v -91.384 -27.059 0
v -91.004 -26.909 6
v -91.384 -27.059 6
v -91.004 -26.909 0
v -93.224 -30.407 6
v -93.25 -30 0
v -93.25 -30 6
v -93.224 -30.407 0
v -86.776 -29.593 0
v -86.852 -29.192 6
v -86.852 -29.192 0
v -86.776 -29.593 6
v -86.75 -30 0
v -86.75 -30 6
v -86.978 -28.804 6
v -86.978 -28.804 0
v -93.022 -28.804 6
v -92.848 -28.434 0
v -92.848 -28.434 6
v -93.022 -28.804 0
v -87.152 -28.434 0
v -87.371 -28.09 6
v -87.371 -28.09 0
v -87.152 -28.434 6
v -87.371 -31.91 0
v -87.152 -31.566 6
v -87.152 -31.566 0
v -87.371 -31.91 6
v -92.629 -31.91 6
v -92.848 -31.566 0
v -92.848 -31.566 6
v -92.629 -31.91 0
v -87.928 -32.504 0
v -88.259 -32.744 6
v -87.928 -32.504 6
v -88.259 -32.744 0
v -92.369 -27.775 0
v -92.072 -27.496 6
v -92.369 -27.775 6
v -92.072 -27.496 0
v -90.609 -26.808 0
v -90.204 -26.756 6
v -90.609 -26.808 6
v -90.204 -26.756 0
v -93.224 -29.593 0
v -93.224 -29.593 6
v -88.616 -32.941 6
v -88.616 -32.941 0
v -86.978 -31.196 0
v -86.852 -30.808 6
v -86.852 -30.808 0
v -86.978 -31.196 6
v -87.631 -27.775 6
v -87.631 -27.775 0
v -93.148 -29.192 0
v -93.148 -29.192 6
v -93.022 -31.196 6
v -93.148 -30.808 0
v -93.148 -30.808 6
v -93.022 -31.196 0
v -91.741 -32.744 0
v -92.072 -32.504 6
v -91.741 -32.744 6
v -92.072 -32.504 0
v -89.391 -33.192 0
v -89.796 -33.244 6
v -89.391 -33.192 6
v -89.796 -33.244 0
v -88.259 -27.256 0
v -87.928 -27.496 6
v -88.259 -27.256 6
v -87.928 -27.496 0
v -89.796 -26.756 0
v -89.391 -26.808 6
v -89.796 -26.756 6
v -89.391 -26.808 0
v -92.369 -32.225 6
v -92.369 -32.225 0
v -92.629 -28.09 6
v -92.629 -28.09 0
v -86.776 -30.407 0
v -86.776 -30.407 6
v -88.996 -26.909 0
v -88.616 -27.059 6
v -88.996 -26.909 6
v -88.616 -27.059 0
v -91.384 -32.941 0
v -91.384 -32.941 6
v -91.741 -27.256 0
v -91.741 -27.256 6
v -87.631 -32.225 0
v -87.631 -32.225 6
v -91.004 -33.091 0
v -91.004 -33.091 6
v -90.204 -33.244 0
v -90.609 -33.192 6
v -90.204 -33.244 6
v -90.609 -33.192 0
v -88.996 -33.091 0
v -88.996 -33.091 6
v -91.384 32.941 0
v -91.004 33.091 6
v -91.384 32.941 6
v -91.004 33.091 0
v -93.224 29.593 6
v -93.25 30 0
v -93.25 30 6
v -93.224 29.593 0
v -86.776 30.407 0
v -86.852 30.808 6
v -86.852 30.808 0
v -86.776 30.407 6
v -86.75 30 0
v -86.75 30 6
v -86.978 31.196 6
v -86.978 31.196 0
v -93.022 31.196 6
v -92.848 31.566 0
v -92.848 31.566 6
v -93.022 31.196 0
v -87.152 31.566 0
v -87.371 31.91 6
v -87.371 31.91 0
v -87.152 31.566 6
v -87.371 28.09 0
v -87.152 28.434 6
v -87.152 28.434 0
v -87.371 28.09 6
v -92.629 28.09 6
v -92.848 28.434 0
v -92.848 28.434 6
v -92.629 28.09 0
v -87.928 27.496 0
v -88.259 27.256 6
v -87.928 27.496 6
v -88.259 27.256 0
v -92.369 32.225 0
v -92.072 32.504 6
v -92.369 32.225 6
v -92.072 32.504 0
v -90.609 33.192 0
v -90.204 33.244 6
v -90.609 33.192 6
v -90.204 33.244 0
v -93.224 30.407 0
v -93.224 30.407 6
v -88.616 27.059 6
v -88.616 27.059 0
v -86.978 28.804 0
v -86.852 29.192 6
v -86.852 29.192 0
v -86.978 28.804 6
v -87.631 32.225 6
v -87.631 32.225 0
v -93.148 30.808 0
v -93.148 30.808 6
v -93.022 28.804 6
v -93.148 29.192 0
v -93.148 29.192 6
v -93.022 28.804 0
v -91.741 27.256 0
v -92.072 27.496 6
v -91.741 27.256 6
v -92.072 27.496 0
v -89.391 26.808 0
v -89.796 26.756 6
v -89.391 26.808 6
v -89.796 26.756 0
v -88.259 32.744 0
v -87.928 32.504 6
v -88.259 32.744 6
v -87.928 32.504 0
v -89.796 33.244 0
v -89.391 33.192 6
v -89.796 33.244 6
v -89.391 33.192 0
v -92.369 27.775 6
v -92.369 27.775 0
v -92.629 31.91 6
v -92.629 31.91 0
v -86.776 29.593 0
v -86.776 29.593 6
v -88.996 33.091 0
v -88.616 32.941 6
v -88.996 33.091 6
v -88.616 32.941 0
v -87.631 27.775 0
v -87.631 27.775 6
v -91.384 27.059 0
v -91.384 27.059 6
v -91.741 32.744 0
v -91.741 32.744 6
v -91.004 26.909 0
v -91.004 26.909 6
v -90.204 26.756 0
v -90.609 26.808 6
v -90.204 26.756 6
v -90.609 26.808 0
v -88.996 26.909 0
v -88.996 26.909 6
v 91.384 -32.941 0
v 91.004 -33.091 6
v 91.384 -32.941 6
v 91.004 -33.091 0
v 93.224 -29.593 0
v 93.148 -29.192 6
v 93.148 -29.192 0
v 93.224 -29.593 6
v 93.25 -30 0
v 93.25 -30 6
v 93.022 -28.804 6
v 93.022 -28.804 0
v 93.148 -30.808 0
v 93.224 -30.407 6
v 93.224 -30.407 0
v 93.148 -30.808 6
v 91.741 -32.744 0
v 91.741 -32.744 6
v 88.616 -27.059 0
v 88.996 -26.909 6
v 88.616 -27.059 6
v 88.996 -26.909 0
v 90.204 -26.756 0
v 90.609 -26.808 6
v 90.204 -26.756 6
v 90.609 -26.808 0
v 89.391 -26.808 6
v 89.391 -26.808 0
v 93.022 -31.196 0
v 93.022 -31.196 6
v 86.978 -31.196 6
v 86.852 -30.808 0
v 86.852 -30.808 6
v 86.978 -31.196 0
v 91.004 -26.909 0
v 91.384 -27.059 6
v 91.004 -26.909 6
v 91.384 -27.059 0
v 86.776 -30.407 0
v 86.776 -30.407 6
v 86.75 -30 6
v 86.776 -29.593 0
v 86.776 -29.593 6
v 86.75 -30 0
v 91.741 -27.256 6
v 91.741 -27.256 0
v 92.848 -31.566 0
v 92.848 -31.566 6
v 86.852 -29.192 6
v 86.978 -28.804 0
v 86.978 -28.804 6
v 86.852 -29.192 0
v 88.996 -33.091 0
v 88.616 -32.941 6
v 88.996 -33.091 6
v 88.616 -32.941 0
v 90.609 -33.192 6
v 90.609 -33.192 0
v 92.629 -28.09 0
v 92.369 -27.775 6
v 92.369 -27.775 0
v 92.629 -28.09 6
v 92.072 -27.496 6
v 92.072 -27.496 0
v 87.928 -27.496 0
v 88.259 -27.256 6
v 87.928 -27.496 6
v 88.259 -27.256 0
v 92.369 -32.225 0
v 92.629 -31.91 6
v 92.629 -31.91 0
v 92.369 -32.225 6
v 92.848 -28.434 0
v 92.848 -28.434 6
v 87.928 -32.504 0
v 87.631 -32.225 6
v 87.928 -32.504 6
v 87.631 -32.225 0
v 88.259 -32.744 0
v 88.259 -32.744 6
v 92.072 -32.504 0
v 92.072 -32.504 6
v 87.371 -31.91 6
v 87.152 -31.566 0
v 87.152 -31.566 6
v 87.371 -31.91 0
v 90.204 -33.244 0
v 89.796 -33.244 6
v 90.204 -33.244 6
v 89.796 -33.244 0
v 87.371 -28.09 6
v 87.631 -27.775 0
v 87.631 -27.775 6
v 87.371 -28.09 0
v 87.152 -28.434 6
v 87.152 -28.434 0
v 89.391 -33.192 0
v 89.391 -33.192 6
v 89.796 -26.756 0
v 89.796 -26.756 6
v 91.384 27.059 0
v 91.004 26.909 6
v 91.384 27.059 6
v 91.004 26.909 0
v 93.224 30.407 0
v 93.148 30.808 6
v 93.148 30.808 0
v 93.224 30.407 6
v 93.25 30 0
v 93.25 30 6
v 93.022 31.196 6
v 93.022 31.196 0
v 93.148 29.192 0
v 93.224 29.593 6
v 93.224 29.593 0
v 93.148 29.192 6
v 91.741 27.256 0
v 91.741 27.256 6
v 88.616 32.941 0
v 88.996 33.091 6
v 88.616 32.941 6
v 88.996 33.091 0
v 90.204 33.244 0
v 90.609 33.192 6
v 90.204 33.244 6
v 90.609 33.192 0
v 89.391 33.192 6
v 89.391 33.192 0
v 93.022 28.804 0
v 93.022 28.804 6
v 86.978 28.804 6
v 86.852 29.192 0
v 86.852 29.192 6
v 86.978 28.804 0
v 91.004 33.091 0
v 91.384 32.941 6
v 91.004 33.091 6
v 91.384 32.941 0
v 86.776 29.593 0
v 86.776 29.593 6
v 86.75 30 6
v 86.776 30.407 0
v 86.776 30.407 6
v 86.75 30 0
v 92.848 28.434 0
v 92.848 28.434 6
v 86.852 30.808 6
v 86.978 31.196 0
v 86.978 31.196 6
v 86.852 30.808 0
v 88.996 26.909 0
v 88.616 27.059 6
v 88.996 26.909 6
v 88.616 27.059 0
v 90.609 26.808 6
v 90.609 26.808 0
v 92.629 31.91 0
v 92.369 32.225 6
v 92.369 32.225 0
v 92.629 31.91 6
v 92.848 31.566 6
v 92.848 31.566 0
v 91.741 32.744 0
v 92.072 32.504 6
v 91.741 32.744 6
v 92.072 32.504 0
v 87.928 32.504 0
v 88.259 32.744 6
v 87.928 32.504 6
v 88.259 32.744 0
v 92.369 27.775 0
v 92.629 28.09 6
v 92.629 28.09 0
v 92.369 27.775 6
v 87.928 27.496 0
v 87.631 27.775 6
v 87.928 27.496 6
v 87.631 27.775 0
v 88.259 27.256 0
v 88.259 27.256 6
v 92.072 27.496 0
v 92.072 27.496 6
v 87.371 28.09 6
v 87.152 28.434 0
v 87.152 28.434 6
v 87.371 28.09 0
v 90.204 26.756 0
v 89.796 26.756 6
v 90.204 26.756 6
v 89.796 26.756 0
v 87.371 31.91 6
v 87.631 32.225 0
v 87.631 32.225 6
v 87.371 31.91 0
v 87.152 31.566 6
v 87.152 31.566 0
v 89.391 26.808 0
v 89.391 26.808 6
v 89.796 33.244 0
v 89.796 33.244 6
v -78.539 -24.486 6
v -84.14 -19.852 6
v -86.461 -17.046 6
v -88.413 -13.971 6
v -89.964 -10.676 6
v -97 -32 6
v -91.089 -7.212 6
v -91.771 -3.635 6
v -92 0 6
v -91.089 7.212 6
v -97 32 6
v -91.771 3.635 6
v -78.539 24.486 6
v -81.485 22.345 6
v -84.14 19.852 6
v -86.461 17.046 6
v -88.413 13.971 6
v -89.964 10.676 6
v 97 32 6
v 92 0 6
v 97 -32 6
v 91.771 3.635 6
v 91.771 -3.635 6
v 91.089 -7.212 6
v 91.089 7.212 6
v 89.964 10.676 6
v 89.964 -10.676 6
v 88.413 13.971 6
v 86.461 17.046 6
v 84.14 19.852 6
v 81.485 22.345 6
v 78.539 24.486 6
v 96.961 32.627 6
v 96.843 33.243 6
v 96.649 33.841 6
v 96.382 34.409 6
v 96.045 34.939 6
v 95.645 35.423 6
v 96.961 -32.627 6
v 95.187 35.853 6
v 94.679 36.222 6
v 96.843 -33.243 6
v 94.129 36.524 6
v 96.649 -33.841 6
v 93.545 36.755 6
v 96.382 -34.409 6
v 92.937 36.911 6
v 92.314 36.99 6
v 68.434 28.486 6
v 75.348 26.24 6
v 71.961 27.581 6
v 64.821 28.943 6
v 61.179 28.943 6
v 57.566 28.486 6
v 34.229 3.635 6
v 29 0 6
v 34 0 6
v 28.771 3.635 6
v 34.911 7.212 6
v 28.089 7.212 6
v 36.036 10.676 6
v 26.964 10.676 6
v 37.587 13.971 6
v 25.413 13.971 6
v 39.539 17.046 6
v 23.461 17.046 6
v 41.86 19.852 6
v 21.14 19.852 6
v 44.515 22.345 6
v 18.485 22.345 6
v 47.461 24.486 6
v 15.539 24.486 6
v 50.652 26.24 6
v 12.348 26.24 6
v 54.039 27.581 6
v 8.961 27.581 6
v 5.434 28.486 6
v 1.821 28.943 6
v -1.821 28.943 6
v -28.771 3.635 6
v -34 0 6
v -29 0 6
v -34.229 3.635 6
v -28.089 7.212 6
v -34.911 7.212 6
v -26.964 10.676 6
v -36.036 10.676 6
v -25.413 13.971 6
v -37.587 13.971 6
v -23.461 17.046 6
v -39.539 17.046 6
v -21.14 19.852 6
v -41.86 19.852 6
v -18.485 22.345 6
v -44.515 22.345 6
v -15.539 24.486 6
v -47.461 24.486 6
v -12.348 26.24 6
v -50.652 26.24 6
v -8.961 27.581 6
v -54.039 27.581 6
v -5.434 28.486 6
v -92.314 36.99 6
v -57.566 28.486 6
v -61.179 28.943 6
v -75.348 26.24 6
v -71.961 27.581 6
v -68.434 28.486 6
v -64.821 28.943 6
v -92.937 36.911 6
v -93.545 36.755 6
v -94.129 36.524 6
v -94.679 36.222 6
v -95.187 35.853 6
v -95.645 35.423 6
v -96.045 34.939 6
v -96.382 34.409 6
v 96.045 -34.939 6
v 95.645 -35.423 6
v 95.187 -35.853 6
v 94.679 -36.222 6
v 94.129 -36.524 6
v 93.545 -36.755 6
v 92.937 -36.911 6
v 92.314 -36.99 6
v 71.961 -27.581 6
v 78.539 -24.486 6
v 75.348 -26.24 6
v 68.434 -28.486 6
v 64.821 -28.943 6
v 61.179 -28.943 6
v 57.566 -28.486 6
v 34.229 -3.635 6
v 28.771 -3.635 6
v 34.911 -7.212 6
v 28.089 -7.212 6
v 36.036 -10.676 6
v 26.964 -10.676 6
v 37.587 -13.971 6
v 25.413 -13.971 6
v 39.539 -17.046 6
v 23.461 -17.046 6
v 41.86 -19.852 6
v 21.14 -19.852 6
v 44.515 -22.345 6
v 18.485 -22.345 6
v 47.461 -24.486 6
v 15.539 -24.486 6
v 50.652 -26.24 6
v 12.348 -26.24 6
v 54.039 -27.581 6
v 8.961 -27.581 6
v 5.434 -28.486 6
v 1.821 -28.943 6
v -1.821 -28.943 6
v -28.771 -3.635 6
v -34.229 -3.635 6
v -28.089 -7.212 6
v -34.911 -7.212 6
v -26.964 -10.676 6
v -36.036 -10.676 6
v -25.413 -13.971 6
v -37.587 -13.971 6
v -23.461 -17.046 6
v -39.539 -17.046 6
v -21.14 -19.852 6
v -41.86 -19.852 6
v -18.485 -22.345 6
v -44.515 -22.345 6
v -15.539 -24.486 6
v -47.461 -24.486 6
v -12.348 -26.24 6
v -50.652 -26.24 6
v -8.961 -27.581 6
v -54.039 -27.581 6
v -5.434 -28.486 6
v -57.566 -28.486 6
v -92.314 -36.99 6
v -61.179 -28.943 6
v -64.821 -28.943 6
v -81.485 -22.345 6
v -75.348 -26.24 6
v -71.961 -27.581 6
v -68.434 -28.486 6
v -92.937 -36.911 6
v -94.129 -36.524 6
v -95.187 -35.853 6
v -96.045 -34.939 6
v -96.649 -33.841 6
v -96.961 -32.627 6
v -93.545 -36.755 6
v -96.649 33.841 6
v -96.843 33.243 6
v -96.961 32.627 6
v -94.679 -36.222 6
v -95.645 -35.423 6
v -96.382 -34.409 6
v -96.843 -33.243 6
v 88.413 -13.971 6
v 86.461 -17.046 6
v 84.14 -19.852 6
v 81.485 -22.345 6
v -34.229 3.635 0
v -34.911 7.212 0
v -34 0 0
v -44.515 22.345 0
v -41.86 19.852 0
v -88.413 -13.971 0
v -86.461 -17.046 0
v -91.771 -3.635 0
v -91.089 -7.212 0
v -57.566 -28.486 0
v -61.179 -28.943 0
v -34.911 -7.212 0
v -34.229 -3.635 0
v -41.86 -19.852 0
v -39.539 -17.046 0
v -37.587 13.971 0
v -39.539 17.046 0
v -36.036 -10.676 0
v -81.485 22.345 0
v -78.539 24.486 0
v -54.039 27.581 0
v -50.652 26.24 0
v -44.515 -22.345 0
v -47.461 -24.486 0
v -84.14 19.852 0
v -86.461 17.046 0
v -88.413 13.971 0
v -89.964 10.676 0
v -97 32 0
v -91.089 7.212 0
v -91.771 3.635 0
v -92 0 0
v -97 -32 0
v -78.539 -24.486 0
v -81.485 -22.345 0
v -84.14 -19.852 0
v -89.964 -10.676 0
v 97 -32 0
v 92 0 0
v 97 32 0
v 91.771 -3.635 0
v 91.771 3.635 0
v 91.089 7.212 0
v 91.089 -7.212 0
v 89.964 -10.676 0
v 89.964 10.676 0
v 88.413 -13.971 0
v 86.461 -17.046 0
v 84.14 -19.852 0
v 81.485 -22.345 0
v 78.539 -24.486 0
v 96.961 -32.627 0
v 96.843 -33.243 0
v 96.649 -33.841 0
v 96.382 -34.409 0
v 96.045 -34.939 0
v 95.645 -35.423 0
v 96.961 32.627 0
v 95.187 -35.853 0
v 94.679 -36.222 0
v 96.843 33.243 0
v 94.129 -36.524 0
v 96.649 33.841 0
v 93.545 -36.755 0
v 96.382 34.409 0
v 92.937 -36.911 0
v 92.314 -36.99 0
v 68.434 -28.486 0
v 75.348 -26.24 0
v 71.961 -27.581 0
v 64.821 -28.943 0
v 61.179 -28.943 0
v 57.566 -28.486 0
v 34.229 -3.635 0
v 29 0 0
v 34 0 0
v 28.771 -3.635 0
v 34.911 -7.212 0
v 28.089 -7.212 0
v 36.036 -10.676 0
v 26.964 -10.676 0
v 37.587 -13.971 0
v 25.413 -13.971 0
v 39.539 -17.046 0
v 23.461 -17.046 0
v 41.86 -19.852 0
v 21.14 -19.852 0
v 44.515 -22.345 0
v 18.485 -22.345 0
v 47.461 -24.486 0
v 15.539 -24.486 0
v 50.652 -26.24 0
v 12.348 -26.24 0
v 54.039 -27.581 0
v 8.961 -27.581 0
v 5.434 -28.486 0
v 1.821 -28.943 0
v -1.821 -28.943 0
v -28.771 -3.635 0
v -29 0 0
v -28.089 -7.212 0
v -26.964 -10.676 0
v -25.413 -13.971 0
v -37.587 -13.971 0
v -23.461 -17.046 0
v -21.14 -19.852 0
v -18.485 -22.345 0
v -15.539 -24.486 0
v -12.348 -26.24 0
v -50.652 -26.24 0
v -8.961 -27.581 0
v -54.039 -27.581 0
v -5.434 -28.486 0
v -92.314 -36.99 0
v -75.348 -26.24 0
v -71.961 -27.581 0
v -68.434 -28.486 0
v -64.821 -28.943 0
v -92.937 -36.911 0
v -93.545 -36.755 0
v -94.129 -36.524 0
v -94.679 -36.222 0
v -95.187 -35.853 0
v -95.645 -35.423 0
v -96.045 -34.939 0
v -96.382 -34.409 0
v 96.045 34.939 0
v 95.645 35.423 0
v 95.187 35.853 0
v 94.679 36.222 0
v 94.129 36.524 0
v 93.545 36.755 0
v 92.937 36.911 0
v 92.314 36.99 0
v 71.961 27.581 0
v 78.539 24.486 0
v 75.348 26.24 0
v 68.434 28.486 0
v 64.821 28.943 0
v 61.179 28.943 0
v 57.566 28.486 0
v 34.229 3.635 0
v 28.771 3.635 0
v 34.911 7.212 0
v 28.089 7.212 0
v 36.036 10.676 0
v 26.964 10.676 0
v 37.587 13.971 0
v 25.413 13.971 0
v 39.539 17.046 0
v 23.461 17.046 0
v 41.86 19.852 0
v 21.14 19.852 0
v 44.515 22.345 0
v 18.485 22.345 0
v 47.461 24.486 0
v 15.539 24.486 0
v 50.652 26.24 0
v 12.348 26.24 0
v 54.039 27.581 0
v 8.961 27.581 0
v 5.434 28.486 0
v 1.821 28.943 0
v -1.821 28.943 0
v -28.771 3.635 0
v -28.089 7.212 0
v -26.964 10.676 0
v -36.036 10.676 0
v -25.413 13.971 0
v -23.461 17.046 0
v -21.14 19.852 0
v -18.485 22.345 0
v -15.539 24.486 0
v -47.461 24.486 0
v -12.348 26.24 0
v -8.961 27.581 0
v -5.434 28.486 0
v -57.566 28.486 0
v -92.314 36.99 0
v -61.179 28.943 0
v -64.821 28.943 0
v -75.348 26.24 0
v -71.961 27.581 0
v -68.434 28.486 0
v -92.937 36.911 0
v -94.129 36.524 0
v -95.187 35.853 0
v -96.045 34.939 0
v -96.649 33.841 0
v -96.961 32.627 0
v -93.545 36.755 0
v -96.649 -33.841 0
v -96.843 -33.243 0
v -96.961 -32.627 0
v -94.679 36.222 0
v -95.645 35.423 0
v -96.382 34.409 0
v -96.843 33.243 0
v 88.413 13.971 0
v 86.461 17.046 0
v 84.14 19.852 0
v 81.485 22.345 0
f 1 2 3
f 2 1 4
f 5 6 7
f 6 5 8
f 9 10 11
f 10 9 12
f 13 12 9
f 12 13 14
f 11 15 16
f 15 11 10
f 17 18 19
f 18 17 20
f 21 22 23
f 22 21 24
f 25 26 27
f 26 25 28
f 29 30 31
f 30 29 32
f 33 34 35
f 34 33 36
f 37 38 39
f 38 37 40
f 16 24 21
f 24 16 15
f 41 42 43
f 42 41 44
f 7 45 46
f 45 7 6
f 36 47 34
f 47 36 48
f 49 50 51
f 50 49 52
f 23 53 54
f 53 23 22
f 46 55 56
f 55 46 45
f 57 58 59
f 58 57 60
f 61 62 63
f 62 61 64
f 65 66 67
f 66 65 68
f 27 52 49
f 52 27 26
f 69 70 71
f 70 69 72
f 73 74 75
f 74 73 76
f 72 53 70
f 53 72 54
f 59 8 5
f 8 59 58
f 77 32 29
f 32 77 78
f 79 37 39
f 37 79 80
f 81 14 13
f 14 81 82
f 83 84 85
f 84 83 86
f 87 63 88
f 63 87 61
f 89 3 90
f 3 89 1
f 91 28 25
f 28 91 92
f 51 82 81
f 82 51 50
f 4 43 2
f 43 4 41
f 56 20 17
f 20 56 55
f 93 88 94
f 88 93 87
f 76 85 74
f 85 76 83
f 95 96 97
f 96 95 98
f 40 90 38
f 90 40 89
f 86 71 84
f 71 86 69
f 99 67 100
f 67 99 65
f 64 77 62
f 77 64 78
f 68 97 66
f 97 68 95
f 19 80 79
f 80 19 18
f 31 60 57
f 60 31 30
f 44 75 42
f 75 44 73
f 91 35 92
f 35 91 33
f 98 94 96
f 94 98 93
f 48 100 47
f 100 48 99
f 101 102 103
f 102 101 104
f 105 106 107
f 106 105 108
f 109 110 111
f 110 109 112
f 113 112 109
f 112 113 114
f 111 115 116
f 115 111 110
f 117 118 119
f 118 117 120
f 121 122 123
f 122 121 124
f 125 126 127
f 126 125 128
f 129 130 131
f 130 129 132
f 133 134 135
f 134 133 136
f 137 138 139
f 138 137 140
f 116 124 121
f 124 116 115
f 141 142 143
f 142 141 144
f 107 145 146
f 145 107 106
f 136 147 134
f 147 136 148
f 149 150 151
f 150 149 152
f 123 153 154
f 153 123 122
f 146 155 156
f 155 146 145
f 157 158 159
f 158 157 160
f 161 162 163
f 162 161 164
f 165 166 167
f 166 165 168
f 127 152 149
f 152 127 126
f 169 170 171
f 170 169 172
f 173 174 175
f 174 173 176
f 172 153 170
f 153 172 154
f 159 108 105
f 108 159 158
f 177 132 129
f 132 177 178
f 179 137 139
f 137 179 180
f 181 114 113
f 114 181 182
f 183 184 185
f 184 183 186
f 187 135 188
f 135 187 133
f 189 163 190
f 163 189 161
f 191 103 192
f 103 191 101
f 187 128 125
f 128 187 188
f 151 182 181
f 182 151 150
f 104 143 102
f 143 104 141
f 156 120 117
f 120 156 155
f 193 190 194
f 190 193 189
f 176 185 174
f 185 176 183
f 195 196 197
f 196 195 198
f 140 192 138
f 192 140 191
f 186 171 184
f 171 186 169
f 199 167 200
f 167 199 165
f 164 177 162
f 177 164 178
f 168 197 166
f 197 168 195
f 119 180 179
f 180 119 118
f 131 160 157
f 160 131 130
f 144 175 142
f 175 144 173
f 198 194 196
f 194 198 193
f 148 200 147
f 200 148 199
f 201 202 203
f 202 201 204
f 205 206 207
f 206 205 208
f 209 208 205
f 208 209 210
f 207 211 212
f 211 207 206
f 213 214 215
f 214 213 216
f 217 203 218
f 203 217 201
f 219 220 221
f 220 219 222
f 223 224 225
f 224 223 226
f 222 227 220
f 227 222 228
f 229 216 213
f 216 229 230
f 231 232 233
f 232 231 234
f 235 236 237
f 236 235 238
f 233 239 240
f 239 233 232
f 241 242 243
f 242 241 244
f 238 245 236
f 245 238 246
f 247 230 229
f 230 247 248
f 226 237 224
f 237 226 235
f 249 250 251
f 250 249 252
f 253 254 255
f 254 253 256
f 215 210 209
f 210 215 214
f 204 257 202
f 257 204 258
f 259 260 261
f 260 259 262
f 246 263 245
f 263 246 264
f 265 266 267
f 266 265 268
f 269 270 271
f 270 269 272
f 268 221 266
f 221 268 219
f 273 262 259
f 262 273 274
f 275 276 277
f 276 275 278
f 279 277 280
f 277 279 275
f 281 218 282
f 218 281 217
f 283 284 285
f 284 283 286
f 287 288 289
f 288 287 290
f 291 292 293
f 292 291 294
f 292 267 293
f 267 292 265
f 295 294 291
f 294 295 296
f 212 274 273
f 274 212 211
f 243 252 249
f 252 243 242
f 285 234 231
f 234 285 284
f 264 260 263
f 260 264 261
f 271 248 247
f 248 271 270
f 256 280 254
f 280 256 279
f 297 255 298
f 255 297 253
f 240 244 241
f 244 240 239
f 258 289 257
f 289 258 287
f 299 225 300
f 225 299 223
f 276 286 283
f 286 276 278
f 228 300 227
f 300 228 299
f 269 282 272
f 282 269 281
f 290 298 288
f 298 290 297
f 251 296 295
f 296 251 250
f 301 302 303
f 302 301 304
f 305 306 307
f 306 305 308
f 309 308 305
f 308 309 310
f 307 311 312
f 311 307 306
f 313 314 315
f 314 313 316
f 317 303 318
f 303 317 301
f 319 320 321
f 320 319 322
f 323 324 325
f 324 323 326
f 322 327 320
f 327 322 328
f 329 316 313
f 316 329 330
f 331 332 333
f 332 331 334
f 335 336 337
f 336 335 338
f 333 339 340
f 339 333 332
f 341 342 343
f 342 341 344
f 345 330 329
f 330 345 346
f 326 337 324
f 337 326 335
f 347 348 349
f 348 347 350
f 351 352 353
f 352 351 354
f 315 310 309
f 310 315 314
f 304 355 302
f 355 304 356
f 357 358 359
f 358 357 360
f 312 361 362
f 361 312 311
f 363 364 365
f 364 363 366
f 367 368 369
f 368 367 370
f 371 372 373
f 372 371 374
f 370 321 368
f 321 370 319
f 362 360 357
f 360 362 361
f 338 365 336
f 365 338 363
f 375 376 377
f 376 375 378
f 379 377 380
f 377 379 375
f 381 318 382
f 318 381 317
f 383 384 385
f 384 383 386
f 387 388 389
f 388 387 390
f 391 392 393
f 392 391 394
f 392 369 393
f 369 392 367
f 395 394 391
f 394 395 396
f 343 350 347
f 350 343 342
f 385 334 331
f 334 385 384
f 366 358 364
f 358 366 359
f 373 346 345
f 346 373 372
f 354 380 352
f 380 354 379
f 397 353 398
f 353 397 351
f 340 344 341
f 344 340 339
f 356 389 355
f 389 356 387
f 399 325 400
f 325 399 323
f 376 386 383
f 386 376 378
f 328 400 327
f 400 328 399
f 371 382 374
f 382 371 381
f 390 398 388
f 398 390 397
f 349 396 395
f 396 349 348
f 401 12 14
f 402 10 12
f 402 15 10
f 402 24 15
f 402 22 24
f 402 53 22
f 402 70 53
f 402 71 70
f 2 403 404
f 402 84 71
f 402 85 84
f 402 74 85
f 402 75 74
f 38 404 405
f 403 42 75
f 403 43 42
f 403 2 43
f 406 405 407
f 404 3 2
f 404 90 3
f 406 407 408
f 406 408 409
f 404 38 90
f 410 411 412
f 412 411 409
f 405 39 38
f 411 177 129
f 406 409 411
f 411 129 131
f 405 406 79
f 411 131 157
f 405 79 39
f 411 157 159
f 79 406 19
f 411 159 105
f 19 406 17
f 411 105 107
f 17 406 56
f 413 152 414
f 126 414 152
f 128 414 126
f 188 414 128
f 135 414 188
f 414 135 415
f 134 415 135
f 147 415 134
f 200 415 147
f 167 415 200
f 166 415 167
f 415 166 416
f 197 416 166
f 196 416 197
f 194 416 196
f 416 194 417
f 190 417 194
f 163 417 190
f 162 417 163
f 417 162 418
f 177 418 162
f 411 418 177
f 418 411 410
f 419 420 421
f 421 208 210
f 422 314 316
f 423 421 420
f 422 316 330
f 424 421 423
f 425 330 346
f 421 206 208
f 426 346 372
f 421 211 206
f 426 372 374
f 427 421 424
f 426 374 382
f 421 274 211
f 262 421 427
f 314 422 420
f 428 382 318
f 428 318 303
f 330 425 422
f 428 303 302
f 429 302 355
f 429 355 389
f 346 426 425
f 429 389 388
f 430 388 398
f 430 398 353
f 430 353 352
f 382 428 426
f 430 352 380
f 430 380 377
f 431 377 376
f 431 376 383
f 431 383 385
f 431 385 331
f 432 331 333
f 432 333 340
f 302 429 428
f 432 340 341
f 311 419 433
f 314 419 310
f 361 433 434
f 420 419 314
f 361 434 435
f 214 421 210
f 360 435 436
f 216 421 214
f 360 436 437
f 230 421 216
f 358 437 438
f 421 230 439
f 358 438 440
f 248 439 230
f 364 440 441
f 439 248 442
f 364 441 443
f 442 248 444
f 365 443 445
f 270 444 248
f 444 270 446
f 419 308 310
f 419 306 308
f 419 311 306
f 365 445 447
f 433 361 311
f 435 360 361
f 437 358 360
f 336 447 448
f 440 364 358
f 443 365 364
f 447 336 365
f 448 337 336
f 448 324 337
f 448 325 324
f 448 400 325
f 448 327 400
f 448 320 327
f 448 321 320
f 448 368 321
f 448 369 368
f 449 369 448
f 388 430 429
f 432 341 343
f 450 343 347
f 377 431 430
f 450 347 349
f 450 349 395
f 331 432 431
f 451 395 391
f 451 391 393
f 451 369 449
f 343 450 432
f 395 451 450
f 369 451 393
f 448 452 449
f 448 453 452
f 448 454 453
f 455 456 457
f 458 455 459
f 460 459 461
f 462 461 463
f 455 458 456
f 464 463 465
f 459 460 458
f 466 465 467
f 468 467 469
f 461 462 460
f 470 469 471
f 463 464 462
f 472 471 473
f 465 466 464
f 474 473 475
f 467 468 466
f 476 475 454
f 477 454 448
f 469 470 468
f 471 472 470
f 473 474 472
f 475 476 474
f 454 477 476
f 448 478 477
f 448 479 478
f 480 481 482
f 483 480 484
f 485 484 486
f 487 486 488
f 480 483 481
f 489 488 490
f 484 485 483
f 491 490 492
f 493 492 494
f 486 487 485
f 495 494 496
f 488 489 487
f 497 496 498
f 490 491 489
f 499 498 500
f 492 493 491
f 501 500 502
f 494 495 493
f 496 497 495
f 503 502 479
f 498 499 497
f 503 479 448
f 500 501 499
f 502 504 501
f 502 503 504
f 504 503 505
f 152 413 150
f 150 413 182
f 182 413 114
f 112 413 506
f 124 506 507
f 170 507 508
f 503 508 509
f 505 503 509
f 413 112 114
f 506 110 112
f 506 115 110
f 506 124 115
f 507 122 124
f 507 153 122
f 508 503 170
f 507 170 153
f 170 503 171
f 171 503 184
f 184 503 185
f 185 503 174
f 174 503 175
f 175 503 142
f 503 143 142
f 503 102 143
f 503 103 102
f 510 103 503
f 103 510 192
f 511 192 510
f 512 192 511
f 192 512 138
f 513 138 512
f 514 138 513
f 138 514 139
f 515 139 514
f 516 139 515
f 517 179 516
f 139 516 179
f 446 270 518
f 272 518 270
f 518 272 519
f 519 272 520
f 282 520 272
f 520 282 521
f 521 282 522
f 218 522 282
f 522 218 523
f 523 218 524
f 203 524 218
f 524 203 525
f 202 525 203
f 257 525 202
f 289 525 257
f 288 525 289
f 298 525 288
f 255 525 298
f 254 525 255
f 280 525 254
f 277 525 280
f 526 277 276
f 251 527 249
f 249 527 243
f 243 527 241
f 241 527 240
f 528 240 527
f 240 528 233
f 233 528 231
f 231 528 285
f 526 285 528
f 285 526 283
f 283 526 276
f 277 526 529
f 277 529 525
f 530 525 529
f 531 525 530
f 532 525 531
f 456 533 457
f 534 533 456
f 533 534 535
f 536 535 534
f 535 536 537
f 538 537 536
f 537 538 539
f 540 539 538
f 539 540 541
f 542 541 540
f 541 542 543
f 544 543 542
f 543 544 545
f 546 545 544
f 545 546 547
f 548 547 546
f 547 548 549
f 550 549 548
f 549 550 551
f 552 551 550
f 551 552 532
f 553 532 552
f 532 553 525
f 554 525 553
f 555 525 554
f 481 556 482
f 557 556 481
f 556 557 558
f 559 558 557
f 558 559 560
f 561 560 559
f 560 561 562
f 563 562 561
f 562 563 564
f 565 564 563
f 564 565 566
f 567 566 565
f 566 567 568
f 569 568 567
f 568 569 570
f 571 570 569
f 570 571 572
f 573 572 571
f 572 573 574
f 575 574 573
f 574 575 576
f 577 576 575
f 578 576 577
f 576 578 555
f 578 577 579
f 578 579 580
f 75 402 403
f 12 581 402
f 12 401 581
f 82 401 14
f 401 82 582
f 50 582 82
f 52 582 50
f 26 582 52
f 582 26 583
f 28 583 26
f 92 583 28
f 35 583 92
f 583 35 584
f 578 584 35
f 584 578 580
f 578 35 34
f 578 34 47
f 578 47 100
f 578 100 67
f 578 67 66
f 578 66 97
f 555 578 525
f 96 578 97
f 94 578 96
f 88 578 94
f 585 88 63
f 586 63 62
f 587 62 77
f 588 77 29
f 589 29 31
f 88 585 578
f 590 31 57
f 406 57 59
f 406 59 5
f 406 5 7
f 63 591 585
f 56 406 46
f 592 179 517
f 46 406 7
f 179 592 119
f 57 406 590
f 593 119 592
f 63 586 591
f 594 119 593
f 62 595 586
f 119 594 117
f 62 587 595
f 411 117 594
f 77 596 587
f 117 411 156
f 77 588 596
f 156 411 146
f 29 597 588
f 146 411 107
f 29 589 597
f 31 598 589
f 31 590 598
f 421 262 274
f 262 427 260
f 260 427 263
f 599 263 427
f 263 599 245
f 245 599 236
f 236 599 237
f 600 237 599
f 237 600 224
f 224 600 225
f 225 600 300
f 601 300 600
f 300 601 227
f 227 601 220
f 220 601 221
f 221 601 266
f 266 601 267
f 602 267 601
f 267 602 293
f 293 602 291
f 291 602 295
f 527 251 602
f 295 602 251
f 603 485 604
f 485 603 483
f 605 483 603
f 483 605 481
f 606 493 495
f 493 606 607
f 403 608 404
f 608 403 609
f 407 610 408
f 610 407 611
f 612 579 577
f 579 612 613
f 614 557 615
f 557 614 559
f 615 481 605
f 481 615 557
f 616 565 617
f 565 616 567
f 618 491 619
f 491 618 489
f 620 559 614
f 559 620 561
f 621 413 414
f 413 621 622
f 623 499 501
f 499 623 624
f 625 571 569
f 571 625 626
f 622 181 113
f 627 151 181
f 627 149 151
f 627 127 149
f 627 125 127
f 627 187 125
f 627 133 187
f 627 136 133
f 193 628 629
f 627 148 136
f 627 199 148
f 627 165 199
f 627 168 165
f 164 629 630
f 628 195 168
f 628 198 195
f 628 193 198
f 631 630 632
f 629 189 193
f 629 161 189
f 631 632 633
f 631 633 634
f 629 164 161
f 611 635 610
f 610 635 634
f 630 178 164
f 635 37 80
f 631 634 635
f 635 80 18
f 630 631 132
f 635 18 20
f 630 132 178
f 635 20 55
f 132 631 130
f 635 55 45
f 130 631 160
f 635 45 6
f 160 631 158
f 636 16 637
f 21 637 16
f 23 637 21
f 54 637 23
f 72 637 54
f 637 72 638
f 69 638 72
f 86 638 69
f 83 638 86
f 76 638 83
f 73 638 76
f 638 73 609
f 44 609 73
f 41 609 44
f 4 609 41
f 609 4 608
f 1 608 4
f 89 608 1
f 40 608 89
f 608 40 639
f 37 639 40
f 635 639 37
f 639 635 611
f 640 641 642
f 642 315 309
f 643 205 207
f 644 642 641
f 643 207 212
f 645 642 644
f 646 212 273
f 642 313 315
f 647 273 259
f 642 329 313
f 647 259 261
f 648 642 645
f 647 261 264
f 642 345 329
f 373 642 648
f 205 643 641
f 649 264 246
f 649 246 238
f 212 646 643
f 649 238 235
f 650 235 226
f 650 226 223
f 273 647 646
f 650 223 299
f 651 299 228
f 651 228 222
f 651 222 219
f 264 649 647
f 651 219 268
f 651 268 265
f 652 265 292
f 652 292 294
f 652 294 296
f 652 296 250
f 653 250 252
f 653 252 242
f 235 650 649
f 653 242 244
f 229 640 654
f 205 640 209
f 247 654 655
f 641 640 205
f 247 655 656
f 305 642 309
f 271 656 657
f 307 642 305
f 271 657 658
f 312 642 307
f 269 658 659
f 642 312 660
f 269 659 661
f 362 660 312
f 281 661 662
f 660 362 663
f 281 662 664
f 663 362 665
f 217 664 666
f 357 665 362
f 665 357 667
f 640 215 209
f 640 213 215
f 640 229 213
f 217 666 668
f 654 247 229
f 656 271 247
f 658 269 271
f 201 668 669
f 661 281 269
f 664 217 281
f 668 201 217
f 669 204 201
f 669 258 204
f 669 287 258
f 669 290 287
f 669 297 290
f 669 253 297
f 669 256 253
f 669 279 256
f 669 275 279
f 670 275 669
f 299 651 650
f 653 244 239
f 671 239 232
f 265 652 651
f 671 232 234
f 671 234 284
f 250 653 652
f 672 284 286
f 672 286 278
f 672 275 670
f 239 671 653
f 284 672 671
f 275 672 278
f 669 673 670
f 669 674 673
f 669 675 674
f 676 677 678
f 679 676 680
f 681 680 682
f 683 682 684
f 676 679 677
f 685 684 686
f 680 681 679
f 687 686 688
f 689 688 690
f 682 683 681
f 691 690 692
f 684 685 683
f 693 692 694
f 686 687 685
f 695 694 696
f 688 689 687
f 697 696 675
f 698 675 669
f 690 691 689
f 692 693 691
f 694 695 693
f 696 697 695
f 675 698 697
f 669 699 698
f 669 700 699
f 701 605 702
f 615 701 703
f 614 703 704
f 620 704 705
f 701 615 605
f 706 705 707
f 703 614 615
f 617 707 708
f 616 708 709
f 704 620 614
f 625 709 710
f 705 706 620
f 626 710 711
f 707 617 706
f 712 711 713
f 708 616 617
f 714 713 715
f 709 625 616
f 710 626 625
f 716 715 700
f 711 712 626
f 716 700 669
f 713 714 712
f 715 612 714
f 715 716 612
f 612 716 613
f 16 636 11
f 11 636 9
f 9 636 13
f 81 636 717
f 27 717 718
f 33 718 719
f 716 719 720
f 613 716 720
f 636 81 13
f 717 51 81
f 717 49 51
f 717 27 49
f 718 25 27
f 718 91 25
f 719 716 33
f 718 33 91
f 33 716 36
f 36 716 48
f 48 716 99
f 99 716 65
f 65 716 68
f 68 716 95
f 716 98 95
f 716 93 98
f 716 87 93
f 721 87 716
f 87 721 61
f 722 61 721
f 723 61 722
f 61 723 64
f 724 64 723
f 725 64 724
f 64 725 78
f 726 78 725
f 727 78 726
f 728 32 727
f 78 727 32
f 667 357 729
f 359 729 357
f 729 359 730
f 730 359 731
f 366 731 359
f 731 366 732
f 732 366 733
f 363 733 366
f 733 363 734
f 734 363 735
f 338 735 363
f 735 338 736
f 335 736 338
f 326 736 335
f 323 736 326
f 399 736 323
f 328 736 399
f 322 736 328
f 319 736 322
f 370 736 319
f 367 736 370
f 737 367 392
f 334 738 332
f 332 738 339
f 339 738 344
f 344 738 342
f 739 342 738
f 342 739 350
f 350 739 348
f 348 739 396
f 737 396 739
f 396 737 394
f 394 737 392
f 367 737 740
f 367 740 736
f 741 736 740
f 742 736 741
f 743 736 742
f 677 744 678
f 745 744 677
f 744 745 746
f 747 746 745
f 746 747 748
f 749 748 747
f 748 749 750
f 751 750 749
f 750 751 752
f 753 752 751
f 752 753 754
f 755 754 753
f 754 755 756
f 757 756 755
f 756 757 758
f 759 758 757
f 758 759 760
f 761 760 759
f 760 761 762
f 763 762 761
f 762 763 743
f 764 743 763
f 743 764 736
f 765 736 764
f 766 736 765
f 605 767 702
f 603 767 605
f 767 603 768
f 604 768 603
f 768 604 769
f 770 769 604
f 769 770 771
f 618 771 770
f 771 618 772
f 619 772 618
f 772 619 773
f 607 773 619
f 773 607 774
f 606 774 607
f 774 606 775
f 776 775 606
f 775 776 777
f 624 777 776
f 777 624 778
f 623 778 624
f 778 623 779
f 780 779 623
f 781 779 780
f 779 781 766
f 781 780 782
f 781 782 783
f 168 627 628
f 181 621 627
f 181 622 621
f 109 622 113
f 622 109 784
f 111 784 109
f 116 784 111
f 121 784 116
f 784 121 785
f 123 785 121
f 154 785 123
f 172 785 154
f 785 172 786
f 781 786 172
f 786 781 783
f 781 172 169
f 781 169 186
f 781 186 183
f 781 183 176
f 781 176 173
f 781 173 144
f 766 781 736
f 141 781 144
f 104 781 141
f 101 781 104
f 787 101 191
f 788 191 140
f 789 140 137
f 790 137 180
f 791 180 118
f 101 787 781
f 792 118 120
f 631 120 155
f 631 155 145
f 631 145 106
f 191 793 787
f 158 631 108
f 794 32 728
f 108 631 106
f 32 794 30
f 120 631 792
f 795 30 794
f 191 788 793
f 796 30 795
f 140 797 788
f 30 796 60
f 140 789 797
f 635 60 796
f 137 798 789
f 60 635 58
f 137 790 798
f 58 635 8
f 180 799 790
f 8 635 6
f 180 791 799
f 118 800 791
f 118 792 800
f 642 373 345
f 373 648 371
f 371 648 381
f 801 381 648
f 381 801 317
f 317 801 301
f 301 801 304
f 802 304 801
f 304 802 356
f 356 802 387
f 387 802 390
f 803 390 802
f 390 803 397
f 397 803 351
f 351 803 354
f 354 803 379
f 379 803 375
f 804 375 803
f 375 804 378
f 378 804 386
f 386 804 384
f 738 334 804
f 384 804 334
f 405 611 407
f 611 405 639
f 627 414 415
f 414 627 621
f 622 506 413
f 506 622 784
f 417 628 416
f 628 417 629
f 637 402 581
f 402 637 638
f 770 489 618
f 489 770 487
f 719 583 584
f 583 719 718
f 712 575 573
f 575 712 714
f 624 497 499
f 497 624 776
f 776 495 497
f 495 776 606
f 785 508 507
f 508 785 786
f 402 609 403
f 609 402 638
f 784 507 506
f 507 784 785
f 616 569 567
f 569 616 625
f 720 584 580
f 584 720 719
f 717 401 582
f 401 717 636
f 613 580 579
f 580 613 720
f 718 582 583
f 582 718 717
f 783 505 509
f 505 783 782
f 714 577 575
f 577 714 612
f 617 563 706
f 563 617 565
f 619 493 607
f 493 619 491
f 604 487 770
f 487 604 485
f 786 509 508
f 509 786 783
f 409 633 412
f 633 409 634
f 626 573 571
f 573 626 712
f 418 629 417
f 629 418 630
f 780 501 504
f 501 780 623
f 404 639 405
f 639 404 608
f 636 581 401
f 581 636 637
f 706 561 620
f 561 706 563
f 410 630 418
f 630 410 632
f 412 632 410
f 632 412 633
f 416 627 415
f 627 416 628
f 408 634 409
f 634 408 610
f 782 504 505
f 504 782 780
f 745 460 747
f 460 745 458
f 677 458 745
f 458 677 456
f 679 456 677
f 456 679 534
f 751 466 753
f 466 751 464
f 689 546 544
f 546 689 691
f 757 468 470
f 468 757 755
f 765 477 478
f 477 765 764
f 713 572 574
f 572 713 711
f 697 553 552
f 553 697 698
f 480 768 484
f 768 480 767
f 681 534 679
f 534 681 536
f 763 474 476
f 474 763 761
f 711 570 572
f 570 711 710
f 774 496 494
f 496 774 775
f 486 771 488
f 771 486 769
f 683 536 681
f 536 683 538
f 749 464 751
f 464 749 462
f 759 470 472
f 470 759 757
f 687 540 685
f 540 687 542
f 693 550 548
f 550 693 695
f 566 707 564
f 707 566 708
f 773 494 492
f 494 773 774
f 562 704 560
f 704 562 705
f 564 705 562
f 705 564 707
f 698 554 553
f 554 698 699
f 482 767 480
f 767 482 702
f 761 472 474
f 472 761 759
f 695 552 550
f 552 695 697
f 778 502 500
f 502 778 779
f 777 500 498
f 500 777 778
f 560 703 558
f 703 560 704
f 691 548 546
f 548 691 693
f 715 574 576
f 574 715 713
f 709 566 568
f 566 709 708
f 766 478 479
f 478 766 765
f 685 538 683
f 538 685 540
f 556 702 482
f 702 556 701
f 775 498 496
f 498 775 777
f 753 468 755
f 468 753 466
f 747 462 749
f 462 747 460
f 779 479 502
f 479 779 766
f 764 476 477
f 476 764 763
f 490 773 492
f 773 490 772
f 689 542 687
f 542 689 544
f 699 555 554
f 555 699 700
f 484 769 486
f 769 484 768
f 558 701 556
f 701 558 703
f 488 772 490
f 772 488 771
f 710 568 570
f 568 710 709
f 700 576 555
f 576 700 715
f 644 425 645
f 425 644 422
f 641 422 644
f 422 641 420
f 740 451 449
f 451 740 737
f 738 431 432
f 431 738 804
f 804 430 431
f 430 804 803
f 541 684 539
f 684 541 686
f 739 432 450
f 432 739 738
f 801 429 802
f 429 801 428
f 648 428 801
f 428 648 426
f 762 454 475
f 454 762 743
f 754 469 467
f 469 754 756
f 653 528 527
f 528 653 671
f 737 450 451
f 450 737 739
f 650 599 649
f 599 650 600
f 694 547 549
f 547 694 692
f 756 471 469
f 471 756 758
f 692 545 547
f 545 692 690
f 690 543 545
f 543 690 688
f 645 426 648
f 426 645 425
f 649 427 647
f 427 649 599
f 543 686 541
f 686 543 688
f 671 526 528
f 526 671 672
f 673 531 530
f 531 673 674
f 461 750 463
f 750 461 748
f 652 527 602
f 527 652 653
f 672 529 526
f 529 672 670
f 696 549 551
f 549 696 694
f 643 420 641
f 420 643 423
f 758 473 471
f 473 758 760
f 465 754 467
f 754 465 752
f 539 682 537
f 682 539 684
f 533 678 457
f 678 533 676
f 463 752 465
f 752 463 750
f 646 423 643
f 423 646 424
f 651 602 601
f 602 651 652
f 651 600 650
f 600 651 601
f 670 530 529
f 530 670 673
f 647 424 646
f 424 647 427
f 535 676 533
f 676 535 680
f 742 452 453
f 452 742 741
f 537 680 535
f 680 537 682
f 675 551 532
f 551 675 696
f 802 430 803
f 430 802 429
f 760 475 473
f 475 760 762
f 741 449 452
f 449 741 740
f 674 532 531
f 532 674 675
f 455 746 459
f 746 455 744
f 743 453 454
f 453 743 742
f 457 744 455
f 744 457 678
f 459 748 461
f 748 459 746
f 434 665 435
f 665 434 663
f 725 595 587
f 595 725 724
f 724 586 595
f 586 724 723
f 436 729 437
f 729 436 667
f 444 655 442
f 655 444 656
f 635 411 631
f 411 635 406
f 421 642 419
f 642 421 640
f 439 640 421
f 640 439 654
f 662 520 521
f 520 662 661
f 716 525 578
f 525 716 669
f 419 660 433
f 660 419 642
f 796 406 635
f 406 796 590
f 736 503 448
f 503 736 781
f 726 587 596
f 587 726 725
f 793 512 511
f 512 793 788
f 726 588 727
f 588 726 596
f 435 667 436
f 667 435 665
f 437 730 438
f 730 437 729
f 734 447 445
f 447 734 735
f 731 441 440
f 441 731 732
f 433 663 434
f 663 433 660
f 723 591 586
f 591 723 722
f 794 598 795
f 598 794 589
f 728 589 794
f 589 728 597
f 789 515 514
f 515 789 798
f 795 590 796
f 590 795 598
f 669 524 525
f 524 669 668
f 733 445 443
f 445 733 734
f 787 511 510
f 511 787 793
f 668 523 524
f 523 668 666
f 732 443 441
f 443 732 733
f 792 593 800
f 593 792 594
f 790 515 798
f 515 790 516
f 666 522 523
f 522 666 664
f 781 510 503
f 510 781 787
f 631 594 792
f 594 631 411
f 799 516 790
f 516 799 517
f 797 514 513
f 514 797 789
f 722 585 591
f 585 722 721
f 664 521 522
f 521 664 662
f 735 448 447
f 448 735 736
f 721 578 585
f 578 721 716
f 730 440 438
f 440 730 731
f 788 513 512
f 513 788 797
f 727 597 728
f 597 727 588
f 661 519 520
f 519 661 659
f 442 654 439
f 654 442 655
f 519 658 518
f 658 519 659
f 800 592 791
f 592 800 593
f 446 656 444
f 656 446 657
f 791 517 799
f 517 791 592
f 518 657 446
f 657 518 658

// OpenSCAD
$fn = 50;

difference() {
	union() {
		hull() {
			translate(v = [-92.0, 32.0, 0]) {
				cylinder(h = 6, r = 5);
			}
			translate(v = [92.0, 32.0, 0]) {
				cylinder(h = 6, r = 5);
			}
			translate(v = [-92.0, -32.0, 0]) {
				cylinder(h = 6, r = 5);
			}
			translate(v = [92.0, -32.0, 0]) {
				cylinder(h = 6, r = 5);
			}
		}
	}
	union() {
		translate(v = [-90.0, -30.0, -100.0]) {
			cylinder(h = 200, r = 3.25);
		}
		translate(v = [-90.0, 30.0, -100.0]) {
			cylinder(h = 200, r = 3.25);
		}
		translate(v = [90.0, -30.0, -100.0]) {
			cylinder(h = 200, r = 3.25);
		}
		translate(v = [90.0, 30.0, -100.0]) {
			cylinder(h = 200, r = 3.25);
		}
		translate(v = [-90.0, -30.0, -100.0]) {
			cylinder(h = 200, r = 1.8);
		}
		translate(v = [-90.0, 30.0, -100.0]) {
			cylinder(h = 200, r = 1.8);
		}
		translate(v = [90.0, -30.0, -100.0]) {
			cylinder(h = 200, r = 1.8);
		}
		translate(v = [90.0, 30.0, -100.0]) {
			cylinder(h = 200, r = 1.8);
		}
		translate(v = [-63.0, 0, 0.0]) {
			cylinder(h = 6, r = 29.0);
		}
		cylinder(h = 6, r = 29.0);
		translate(v = [63.0, 0, 0.0]) {
			cylinder(h = 6, r = 29.0);
		}
	}
}
